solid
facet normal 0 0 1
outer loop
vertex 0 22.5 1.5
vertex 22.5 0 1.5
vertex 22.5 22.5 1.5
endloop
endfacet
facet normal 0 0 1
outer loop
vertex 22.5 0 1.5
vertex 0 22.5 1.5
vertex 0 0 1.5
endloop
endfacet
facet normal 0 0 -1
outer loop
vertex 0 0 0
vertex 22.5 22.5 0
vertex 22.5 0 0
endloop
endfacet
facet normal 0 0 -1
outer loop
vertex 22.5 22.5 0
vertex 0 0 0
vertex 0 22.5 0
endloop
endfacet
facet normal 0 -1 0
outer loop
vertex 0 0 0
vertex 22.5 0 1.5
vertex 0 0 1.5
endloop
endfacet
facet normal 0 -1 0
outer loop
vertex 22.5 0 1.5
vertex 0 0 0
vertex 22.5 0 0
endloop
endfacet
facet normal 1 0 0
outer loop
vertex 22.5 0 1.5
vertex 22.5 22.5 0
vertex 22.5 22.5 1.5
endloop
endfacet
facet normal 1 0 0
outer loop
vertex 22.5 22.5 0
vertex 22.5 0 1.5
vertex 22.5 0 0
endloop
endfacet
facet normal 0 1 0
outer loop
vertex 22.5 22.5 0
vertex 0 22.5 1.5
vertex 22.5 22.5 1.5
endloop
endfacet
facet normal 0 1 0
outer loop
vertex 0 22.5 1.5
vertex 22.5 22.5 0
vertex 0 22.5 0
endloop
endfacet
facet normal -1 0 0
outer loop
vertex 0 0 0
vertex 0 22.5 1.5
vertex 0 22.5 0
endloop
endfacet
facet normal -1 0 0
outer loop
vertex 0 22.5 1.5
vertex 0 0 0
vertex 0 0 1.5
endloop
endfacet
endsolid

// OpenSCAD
r=7;
t=2;
d=32;
centerButtonToBottom=94;

pokerR=4;

$fn=32;

  caseH=centerButtonToBottom+pokerR;

// case();
motorStabilzier();


// translate([2.2,-0.1,2.2]) cube([48,40,14]);
// poker();
// translate([25,0,0]) poker();


// translate([0,pokerR,r+2.8]) difference() {
//   color("blue") translate([-24,-6,0]) cube([48,40,14]);
//   presserShape();
// }


module motorStabilzier() {
 cube([23-0.5,23-.5,1.5]);
}

module fullDrawer() {
translate([0,pokerR,r+2.8]) difference() {
   translate([-24,-6,0]) drawer();
  presserShape();
 }
}
module drawer() {
  difference() {
    cube([48,centerButtonToBottom+pokerR+2,14]);
    translate([2,40,-1]) cube([44,centerButtonToBottom+pokerR-40,16]);
    translate([24,60,8]) rotate([-90,0,0]) cylinder(r=3,h=50);
  }
}

module case() {  
  difference() {
  translate([(48+4.4)/-2,0,r+1]) difference() {
    cube([48+4.4,caseH,14+3.4]);
    translate([2,-0.1,1.5]) cube([48.4,caseH+0.2,14.4]);
  }
      hull() {
        translate([-12.5,pokerR,-0.1]) cylinder(r=pokerR+0.5,h=115+0.2);
        translate([12.5,pokerR,-0.1]) cylinder(r=pokerR+0.5,h=115+0.2);
        translate([-34/2,0,-0.1]) cube([34,pokerR,115+0.2]);
      }
  }

  translate([(48+4.4)/-2,caseH,r+1]) 
  difference() {
    cube([48+4.4,2,14+3.4]);
    translate([(48+4.4)/2,3,(14+3.4)/2]) rotate([90,0,0]) cylinder(r=3,h=5);
  }
  caseBit();
}



module poker() {
  hull() torus(3,1);
  translate([0,0,14]) hull() torus(3,1);

  difference() {
    cylinder(r=pokerR,h=14);

    translate([0,0,7.5]) rotate([90,0,0]) {
      translate([0,0,-1]) hull() {
        translate([-10,0,0]) cylinder(r=4,h=2);
        translate([10,0,0]) cylinder(r=4,h=2);
      }
      translate([0,0,-10]) cylinder(r=0.5,h=20);
    }
  }
}


module caseBit() {
  caseH=centerButtonToBottom+pokerR;
  rotate([-90,0,0])   translate([0,0,caseH])      hull() {
        translate([-d/2,0,0]) cylinder(r=r+t,h=t);
        translate([d/2,0,0]) cylinder(r=r+t,h=t);
      }
  difference() {
    union() {
  rotate([-90,0,0]) {
    difference() {
      hull() {
        translate([-d/2,0,0]) cylinder(r=r+t,h=caseH);
        translate([d/2,0,0]) cylinder(r=r+t,h=caseH);
      }

      translate([0,0,-1]) hull() {
        translate([-d/2,0,0]) cylinder(r=r,h=caseH+2);
        translate([d/2,0,0]) cylinder(r=r,h=caseH+2);
      }
    }
  }
     translate([-36/2,0,r+0.5])  cube([36,40,2]);
    }
     translate([-34/2,-1,r-1])  cube([34,42,2]);
    
    hull() {
      translate([-12.5,pokerR,-0.1]) cylinder(r=pokerR+0.5,h=15+0.2);
      translate([12.5,pokerR,-0.1]) cylinder(r=pokerR+0.5,h=15+0.2);
      translate([-34/2,0,-0.1]) cube([34,pokerR,15+0.2]);
    }
  }

}

module presserShape() {
  o=1;
  translate([0,0,-0.1]) {
 translate([-12.5,0,0])  cylinder(r=pokerR+0.6,h=100);
 translate([12.5,0,0])  cylinder(r=pokerR+0.6,h=100);
 translate([-12.3,-1,0]) cube([25,2,100]);
 translate([-5,0.9,0]) cube([10,5.2,100]);
  translate([-6,3.9,0]) cube([15.4,5.2,100]);
    translate([-7+o,7.9,0]) cube([23,23,100]);
translate([-12+o,11.9,0]) cube([33,3,100]);
  }
color("red") translate([-20,24.6,3]) {
  cube([20,2,20]);
   cube([5,10,20]);
}

}

module torus(r1,r2) {
  rotate_extrude(convexity = 10, $fn=$fn)
    translate([r1, 0, 0])
    circle(r = r2, $fn=$fn);
}
